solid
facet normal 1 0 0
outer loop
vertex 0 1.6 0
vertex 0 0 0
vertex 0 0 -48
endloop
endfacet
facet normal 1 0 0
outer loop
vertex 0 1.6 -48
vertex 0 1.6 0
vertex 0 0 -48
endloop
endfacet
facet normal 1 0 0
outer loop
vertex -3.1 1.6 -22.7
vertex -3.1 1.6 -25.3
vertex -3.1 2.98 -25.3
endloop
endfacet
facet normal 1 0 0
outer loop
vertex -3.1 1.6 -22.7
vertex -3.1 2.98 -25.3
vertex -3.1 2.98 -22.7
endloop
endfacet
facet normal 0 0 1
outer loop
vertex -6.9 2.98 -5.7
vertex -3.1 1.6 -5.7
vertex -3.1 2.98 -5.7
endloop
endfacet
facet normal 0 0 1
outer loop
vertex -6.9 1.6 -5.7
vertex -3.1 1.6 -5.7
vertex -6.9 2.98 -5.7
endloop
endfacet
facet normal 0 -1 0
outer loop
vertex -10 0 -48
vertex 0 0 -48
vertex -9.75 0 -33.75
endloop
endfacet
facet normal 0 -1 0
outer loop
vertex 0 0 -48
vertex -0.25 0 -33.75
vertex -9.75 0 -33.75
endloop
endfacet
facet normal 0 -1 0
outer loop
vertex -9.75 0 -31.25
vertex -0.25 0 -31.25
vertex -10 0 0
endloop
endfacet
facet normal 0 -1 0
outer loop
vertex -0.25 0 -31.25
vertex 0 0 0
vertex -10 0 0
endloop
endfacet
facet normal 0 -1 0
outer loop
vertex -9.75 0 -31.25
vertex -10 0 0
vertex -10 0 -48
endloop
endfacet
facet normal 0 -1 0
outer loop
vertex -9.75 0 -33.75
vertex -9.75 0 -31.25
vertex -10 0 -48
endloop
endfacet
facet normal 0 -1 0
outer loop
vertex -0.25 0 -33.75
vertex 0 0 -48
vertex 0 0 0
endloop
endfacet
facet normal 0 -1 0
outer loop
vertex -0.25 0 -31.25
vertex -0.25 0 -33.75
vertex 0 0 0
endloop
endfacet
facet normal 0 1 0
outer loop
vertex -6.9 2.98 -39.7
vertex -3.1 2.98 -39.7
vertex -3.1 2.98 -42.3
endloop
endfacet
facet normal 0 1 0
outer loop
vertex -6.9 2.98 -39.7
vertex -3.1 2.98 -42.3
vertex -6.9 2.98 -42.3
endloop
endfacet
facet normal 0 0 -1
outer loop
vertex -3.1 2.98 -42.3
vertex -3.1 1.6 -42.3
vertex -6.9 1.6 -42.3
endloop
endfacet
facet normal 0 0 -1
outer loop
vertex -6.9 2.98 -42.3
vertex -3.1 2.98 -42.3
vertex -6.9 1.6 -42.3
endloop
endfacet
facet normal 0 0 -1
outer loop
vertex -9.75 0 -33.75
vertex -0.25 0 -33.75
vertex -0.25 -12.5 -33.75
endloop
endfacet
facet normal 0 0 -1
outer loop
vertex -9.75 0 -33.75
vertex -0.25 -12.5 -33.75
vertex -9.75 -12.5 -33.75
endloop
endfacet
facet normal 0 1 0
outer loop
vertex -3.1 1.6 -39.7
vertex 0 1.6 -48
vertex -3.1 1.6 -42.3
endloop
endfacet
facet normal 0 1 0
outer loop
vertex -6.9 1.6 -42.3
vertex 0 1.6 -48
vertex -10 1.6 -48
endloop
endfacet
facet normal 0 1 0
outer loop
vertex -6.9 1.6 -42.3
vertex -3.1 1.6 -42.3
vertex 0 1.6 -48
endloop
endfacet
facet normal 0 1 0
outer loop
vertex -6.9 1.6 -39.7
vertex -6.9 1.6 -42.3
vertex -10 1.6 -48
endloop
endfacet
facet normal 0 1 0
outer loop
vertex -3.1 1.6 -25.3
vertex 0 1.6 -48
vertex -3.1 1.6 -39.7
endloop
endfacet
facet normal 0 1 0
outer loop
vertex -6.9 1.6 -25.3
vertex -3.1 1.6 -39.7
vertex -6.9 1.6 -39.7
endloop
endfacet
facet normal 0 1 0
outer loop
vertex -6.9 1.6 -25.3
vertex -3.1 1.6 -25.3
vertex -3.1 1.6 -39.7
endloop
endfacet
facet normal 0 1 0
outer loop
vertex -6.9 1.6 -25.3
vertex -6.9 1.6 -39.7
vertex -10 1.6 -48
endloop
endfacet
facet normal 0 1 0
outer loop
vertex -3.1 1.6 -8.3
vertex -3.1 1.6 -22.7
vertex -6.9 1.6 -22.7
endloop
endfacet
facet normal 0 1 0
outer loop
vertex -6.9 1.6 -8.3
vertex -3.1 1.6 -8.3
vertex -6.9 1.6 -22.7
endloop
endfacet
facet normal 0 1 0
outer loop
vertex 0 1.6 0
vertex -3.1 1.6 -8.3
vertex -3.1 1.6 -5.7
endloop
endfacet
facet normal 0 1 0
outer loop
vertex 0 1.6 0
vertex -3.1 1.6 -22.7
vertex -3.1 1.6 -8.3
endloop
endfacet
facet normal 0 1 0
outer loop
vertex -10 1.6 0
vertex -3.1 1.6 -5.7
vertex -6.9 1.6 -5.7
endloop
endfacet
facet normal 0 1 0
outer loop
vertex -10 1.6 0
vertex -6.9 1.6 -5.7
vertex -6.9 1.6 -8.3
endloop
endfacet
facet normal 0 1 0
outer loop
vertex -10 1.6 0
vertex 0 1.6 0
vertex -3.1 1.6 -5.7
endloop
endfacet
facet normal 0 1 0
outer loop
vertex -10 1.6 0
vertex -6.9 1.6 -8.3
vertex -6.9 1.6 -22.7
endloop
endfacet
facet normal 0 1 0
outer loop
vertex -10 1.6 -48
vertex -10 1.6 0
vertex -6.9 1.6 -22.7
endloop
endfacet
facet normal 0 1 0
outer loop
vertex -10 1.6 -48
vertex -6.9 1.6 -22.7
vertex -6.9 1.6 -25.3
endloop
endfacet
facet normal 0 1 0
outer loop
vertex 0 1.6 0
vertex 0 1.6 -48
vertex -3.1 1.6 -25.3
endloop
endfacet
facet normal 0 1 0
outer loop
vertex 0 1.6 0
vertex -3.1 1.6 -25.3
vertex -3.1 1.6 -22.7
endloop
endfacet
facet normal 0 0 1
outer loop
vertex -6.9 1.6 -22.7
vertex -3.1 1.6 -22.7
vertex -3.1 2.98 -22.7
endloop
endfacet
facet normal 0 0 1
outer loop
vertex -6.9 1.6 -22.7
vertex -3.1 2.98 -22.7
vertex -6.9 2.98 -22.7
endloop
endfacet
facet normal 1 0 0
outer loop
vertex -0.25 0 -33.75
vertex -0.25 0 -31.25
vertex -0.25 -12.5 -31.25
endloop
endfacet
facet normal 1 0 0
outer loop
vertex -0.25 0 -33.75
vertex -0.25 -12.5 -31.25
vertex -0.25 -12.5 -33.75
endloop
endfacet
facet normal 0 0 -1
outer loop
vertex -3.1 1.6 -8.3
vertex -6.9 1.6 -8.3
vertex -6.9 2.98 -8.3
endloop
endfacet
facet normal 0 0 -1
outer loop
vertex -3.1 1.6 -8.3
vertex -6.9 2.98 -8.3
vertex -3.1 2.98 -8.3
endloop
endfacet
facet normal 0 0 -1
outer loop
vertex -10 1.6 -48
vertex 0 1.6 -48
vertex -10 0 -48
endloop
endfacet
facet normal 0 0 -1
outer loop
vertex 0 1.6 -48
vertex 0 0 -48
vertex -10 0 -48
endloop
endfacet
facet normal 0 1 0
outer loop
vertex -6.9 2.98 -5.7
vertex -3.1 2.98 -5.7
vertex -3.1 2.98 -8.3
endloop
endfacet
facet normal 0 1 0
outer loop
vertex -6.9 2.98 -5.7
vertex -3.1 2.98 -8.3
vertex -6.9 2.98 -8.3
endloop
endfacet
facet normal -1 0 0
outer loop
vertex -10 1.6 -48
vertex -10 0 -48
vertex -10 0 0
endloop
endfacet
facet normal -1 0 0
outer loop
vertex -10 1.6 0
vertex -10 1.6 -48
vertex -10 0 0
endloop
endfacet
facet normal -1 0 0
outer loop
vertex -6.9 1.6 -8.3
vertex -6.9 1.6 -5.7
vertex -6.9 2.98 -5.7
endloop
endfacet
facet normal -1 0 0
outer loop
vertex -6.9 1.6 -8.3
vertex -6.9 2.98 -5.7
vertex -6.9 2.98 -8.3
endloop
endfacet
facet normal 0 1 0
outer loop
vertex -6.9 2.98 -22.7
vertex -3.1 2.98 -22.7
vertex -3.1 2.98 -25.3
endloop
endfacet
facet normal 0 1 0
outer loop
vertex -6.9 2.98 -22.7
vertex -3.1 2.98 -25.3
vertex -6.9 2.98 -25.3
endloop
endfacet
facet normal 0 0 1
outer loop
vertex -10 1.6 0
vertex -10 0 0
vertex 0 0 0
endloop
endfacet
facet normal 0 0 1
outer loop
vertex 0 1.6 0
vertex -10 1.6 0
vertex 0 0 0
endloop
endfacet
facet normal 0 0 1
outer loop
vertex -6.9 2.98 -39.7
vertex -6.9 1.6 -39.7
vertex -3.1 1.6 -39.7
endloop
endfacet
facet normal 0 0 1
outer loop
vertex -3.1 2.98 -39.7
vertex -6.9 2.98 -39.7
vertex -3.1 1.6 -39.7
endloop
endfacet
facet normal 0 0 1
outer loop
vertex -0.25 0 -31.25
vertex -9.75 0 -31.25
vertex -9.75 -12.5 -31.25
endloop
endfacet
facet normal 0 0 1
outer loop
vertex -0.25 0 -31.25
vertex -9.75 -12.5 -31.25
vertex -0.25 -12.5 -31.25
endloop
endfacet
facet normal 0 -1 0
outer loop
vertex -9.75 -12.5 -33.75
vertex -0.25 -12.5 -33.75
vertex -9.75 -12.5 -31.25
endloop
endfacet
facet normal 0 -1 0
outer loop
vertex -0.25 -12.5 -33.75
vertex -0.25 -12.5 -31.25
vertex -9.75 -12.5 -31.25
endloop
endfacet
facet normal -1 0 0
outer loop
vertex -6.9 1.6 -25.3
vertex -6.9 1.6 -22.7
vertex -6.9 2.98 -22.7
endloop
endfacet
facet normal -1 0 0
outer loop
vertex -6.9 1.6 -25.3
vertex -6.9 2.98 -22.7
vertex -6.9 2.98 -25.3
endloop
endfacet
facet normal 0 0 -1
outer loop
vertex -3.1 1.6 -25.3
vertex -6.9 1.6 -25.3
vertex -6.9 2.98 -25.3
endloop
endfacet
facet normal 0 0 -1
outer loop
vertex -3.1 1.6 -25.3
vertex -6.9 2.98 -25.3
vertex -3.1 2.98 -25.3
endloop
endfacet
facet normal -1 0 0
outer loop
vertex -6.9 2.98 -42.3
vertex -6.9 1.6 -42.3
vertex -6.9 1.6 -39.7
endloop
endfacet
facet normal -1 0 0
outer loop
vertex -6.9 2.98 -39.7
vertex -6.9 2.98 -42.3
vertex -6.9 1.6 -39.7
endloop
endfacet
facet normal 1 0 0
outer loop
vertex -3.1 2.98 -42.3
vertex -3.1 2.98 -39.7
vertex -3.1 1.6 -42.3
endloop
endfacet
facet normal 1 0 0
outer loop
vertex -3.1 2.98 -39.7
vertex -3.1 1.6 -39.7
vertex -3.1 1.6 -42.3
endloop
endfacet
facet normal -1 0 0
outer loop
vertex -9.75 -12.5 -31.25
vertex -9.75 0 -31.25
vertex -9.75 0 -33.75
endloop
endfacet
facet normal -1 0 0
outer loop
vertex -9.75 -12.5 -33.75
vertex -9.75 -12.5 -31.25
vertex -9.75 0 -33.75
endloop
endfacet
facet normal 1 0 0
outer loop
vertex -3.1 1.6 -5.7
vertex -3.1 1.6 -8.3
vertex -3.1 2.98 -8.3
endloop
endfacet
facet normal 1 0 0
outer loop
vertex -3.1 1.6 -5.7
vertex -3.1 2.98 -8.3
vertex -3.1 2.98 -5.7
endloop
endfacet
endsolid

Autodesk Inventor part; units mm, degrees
ref_plane "YZ Plane" through (0, 0, 0) normal (1, 0, 0) x (0, 1, 0)
ref_plane "XZ Plane" through (0, 0, 0) normal (0, 1, 0) x (-1, 0, 0)
ref_plane "XY Plane" through (0, 0, 0) normal (0, 0, 1) x (1, 0, 0)
sketch "Sketch2" plane through (0, 0, 0) normal (0, 1, 0) x (-1, 0, 0)
  line L0 (10, 0) -> (0, 0)
  line L1 (0, 0) -> (0, -48)
  line L2 (0, -48) -> (10, -48)
  line L3 (10, -48) -> (10, 0)
  line L4 (6.9, -8.3) -> (3.1, -8.3)
  line L5 (3.1, -8.3) -> (3.1, -5.7)
  line L6 (3.1, -5.7) -> (6.9, -5.7)
  line L7 (6.9, -5.7) -> (6.9, -8.3)
  line L8 (6.9, -39.7) -> (3.1, -39.7)
  line L9 (3.1, -39.7) -> (3.1, -42.3)
  line L10 (3.1, -42.3) -> (6.9, -42.3)
  line L11 (6.9, -42.3) -> (6.9, -39.7)
  line L12 (3.1, -22.7) -> (6.9, -22.7)
  line L13 (3.1, -25.3) -> (3.1, -22.7)
  line L14 (6.9, -25.3) -> (3.1, -25.3)
  line L15 (6.9, -22.7) -> (6.9, -25.3)
  line L16 (23.6892, -32.5) -> (-2.3247, -32.5) construction
  line L17 (5, -54.7987) -> (5, -48.1542) construction
  line L18 (5, 9.3713) -> (5, -46.1174) construction
  line L19 (11.7769, -7) -> (1.25, -7) construction
  line L20 (11.7769, -24) -> (1.25, -24) construction
  line L21 (11.7769, -41) -> (1.25, -41) construction
  line L22 (9.75, -31.25) -> (0.25, -31.25)
  line L23 (0.25, -33.75) -> (9.75, -33.75)
  line L24 (9.75, -31.25) -> (9.75, -33.75)
  line L25 (0.25, -31.25) -> (0.25, -33.75)
  dimension "d0" = 10
  dimension "d1" = 48
  dimension "d13" = 3.8
  dimension "d14" = 2.6
  dimension "d40" = 5
  dimension "d49" = 15.5
  dimension "d50" = 7
  dimension "d51" = 24
  dimension "d52" = 41
  dimension "d53" = 2.5
  dimension "d54" = 9.5
extrude "Extrusion1" add sketch "Sketch2" along normal blind 1.6 contours L3 L2 L1 L0 | L4 L5 L6 L7 | L11 L10 L9 L8 | L12 L15 L14 L13 | L24 L23 L25 L22
extrude "Extrusion4" add sketch "Sketch2" along normal blind 2.98 contours L4 L5 L6 L7 | L11 L10 L9 L8 | L12 L15 L14 L13
sketch "Sketch3" plane through (0, 2.98, 0) normal (0, 1, 0) x (1, 0, 0)
  line L0 (-3.1, 25.3) -> (-6.9, 25.3) construction
  line L1 (-6.9, 22.7) -> (-3.1, 22.7) construction
  point P0 (0, 0)
  point P1 (-5.1459, 24.0493)
extrude "Extrusion5" add sketch "Sketch2" against normal blind 12.5 contours L24 L23 L25 L22
properties part number "Sensor_Board_dummy"
